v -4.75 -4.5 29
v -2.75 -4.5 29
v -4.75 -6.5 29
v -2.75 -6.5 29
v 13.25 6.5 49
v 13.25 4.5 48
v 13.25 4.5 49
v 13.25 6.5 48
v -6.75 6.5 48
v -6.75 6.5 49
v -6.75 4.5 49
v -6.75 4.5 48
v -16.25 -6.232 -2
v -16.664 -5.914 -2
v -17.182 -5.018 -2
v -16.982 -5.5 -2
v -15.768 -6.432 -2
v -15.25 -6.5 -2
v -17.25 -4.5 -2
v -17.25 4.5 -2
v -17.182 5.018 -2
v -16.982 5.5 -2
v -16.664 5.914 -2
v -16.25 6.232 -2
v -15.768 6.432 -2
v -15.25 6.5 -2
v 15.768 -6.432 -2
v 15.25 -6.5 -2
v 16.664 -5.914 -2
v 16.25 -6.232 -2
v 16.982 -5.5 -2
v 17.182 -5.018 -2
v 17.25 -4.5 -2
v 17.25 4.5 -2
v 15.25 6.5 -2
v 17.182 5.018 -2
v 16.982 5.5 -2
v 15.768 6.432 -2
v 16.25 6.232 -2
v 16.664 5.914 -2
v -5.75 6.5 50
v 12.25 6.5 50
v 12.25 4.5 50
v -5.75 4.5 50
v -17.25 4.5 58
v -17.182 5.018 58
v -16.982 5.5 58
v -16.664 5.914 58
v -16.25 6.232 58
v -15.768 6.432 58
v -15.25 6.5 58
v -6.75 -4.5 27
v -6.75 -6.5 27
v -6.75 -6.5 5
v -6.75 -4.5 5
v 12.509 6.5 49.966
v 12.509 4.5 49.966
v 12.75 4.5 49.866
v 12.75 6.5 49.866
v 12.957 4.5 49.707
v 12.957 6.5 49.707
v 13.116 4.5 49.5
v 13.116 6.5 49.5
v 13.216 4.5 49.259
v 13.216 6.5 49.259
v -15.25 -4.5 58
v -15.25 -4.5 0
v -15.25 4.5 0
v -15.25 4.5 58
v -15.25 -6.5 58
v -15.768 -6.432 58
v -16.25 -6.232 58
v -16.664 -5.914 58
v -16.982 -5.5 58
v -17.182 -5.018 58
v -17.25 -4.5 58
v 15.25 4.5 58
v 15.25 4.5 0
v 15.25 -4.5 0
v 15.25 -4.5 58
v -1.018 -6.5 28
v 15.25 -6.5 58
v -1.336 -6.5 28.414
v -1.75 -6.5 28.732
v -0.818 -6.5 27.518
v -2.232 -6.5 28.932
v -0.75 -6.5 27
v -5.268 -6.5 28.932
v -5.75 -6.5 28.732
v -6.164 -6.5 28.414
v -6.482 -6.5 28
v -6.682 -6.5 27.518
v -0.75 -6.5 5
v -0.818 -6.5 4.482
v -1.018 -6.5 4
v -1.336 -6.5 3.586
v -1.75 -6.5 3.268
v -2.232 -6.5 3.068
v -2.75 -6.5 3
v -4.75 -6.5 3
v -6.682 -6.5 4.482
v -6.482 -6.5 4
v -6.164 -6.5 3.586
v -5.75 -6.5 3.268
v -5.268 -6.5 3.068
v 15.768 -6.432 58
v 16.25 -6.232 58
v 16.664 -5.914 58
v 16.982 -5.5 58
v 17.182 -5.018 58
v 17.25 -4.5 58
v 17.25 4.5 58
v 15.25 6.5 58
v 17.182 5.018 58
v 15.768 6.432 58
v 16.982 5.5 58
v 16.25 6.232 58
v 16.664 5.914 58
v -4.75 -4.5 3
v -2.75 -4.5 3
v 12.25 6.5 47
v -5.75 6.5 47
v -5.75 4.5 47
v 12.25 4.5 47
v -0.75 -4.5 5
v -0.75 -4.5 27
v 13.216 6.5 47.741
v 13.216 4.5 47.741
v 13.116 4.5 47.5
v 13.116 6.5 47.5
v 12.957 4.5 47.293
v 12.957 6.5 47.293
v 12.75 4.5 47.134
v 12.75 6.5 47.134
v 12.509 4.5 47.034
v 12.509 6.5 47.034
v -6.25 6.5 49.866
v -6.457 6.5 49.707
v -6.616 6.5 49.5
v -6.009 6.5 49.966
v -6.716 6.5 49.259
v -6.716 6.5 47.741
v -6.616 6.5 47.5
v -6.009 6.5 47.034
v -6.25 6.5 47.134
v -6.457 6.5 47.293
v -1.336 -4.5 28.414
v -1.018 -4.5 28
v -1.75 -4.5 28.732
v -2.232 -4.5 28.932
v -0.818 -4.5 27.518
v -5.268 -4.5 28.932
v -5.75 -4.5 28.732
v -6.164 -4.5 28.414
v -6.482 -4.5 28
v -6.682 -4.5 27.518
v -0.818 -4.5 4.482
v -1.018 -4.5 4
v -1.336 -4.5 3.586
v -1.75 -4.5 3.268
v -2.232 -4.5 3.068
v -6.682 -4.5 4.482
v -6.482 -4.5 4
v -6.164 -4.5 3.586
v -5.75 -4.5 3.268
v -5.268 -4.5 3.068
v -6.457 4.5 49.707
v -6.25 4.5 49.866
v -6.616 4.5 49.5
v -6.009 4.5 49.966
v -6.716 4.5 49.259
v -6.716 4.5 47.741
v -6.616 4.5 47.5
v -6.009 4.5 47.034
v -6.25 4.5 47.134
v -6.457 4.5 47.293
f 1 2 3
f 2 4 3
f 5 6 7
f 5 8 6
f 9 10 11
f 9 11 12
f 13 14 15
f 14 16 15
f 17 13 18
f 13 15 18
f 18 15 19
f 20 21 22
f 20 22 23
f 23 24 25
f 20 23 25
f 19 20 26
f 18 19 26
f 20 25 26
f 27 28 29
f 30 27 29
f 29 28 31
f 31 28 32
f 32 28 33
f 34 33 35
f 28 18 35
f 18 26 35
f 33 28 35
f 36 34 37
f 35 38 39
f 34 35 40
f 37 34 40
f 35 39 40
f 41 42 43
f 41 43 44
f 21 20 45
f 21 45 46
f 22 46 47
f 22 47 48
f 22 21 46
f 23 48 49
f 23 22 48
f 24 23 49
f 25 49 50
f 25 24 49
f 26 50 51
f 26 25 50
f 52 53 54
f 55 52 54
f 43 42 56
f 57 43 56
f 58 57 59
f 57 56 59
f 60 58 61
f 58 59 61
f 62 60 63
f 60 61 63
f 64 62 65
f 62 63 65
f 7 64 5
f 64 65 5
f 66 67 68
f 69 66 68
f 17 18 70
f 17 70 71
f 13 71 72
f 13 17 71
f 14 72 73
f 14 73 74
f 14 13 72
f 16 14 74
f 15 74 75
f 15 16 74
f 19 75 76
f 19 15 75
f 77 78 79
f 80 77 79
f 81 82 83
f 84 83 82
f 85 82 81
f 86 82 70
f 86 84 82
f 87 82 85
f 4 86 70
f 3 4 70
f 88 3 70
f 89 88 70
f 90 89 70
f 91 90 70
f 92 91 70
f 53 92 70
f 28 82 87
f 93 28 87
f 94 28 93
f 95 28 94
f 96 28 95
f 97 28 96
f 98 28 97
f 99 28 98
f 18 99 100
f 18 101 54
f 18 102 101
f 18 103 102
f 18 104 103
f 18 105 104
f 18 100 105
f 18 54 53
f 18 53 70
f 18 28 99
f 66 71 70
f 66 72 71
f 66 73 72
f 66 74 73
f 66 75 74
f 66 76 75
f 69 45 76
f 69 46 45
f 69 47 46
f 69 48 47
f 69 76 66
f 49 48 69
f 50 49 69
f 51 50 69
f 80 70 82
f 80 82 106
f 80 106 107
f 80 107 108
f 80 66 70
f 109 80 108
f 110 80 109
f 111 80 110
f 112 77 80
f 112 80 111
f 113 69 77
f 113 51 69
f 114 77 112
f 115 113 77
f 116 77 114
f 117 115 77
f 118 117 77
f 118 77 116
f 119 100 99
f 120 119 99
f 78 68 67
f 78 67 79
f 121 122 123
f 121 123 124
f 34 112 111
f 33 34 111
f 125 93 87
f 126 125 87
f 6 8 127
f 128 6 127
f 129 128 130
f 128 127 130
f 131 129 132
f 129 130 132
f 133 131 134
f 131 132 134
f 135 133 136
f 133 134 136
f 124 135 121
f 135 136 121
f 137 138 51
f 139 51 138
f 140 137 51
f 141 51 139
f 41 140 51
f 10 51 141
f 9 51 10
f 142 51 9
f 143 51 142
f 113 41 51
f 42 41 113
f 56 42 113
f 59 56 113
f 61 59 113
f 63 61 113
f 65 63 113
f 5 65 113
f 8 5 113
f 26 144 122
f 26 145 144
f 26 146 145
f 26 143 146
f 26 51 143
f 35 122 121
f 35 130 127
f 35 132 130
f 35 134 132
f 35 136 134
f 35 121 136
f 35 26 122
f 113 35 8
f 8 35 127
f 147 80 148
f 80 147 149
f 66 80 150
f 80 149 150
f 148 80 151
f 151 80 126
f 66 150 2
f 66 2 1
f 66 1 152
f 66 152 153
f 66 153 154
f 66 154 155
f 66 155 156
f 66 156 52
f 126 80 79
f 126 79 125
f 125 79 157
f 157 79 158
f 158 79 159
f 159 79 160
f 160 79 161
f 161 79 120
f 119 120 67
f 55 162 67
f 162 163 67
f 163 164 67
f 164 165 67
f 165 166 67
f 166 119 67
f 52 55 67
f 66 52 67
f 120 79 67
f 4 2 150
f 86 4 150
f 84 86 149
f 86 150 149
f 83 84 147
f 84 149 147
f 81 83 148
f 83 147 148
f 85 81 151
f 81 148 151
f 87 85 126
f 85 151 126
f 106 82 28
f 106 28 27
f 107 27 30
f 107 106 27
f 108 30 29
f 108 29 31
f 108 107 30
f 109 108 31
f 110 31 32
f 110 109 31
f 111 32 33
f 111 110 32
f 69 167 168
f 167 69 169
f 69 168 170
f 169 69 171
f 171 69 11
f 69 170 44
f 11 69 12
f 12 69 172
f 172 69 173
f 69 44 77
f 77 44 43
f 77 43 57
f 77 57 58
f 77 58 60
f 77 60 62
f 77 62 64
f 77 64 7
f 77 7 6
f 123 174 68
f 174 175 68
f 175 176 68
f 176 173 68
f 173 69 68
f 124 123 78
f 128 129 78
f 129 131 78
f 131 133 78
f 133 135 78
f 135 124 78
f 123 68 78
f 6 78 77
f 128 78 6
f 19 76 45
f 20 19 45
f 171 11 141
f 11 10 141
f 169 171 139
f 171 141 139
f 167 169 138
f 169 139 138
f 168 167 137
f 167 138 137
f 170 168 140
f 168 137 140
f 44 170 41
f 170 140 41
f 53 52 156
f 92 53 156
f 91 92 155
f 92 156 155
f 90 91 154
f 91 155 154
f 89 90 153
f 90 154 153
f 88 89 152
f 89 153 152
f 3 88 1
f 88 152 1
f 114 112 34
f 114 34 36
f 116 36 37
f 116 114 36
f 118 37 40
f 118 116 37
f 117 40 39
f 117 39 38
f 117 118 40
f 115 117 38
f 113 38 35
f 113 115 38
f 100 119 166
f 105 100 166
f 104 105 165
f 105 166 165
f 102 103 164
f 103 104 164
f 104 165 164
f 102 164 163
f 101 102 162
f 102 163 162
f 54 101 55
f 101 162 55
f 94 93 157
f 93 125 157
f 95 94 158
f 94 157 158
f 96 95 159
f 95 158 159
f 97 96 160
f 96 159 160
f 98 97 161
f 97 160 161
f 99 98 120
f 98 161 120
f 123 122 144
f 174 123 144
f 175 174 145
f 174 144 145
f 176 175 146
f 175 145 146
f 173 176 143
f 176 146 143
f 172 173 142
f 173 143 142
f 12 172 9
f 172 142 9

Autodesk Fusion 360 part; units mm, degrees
sketch "Skizze1" plane through (0, 0, 0) normal (0, 0, 1) x (1, 0, 0)
  line L0 (15.25, -4.5) -> (-15.25, -4.5)
  line L1 (-15.25, -4.5) -> (-15.25, 4.5)
  line L2 (-15.25, 4.5) -> (15.25, 4.5)
  line L3 (15.25, 4.5) -> (15.25, -4.5)
  line L4 (15.25, -4.5) -> (-15.25, 4.5) construction
  line L5 (-15.25, -4.5) -> (15.25, 4.5) construction
  line L6 (17.25, -6.5) -> (-17.25, -6.5)
  line L7 (-17.25, -6.5) -> (-17.25, 6.5)
  line L8 (-17.25, 6.5) -> (17.25, 6.5)
  line L9 (17.25, 6.5) -> (17.25, -6.5)
  line L10 (17.25, -6.5) -> (-17.25, 6.5) construction
  line L11 (-17.25, -6.5) -> (17.25, 6.5) construction
  dimension "d1" = 30.5
  dimension "d2" = 9
  dimension "d3" = 34.5
  dimension "d4" = 13
extrude "Extrusion1" add sketch "Skizze1" against normal blind 2 contours L0 L1 L2 L3 | L6 L7 L8 L9
extrude "Extrusion2" add sketch "Skizze1" along normal blind 58
fillet "Abrundung1" radius 2 4 edges at (-17.25, -6.5, 28) (-17.25, 6.5, 28) (17.25, -6.5, 28) (17.25, 6.5, 28)
sketch "Skizze2" plane through (0, -6.5, 0) normal (0, -1, 0) x (1, 0, 0)
  line L0 (15.25, -2) -> (15.25, 58)
  line L1 (15.25, 58) -> (-15.25, 58)
  line L2 (-15.25, 58) -> (-15.25, -2)
  line L3 (-15.25, -2) -> (15.25, -2)
  line L4 (-6.75, 3) -> (-0.75, 3)
  line L5 (-0.75, 3) -> (-0.75, 29)
  line L6 (-0.75, 29) -> (-6.75, 29)
  line L7 (-6.75, 29) -> (-6.75, 3)
  line L8 (-17.25, 58) -> (-17.25, -2)
  line L9 (17.25, 0) -> (-17.25, 0)
  dimension "d11" = 6
  dimension "d12" = 26
  dimension "d19" = 8.5
  dimension "d20" = 3
extrude "Extrusion3" cut sketch "Skizze2" against normal blind 2 contours L4 L5 L6 L7
fillet "Abrundung2" radius 2 4 edges at (-0.75, -5.5, 29) (-6.75, -5.5, 29) (-0.75, -5.5, 3) (-6.75, -5.5, 3)
sketch "Skizze3" plane through (0, 6.5, 0) normal (0, 1, 0) x (-1, 0, 0)
  line L0 (-15.25, 58) -> (-15.25, -2)
  line L1 (-15.25, -2) -> (15.25, -2)
  line L2 (15.25, -2) -> (15.25, 58)
  line L3 (15.25, 58) -> (-15.25, 58)
  line L4 (-12.25, 50) -> (5.75, 50)
  line L5 (6.75, 49) -> (6.75, 48)
  line L6 (5.75, 47) -> (-12.25, 47)
  line L7 (-13.25, 48) -> (-13.25, 49)
  line L8 (-15.25, 0) -> (15.25, 0)
  arc A0 (-12.25, 50) -> (-13.25, 49) centre (-12.25, 49) ccw
  arc A1 (-13.25, 48) -> (-12.25, 47) centre (-12.25, 48) ccw
  arc A2 (5.75, 47) -> (6.75, 48) centre (5.75, 48) ccw
  arc A3 (6.75, 49) -> (5.75, 50) centre (5.75, 49) ccw
  point P0 (-13.25, 50)
  point P1 (6.75, 50)
  dimension "d21" = 47
  dimension "d22" = 50
  dimension "d23" = 20
  dimension "d24" = 2
  dimension "d27" = 1
extrude "Extrusion4" cut sketch "Skizze3" against normal blind 3 contours L4 L5 L6 L7 A0 A1 A2 A3
equation "d3 = d1 + ( ( 2 * 2 ) * 1 mm )"
equation "d4 = d2 + ( ( 2 * 2 ) * 1 mm )"
equation "d12 = 28 mm - 2 mm"
